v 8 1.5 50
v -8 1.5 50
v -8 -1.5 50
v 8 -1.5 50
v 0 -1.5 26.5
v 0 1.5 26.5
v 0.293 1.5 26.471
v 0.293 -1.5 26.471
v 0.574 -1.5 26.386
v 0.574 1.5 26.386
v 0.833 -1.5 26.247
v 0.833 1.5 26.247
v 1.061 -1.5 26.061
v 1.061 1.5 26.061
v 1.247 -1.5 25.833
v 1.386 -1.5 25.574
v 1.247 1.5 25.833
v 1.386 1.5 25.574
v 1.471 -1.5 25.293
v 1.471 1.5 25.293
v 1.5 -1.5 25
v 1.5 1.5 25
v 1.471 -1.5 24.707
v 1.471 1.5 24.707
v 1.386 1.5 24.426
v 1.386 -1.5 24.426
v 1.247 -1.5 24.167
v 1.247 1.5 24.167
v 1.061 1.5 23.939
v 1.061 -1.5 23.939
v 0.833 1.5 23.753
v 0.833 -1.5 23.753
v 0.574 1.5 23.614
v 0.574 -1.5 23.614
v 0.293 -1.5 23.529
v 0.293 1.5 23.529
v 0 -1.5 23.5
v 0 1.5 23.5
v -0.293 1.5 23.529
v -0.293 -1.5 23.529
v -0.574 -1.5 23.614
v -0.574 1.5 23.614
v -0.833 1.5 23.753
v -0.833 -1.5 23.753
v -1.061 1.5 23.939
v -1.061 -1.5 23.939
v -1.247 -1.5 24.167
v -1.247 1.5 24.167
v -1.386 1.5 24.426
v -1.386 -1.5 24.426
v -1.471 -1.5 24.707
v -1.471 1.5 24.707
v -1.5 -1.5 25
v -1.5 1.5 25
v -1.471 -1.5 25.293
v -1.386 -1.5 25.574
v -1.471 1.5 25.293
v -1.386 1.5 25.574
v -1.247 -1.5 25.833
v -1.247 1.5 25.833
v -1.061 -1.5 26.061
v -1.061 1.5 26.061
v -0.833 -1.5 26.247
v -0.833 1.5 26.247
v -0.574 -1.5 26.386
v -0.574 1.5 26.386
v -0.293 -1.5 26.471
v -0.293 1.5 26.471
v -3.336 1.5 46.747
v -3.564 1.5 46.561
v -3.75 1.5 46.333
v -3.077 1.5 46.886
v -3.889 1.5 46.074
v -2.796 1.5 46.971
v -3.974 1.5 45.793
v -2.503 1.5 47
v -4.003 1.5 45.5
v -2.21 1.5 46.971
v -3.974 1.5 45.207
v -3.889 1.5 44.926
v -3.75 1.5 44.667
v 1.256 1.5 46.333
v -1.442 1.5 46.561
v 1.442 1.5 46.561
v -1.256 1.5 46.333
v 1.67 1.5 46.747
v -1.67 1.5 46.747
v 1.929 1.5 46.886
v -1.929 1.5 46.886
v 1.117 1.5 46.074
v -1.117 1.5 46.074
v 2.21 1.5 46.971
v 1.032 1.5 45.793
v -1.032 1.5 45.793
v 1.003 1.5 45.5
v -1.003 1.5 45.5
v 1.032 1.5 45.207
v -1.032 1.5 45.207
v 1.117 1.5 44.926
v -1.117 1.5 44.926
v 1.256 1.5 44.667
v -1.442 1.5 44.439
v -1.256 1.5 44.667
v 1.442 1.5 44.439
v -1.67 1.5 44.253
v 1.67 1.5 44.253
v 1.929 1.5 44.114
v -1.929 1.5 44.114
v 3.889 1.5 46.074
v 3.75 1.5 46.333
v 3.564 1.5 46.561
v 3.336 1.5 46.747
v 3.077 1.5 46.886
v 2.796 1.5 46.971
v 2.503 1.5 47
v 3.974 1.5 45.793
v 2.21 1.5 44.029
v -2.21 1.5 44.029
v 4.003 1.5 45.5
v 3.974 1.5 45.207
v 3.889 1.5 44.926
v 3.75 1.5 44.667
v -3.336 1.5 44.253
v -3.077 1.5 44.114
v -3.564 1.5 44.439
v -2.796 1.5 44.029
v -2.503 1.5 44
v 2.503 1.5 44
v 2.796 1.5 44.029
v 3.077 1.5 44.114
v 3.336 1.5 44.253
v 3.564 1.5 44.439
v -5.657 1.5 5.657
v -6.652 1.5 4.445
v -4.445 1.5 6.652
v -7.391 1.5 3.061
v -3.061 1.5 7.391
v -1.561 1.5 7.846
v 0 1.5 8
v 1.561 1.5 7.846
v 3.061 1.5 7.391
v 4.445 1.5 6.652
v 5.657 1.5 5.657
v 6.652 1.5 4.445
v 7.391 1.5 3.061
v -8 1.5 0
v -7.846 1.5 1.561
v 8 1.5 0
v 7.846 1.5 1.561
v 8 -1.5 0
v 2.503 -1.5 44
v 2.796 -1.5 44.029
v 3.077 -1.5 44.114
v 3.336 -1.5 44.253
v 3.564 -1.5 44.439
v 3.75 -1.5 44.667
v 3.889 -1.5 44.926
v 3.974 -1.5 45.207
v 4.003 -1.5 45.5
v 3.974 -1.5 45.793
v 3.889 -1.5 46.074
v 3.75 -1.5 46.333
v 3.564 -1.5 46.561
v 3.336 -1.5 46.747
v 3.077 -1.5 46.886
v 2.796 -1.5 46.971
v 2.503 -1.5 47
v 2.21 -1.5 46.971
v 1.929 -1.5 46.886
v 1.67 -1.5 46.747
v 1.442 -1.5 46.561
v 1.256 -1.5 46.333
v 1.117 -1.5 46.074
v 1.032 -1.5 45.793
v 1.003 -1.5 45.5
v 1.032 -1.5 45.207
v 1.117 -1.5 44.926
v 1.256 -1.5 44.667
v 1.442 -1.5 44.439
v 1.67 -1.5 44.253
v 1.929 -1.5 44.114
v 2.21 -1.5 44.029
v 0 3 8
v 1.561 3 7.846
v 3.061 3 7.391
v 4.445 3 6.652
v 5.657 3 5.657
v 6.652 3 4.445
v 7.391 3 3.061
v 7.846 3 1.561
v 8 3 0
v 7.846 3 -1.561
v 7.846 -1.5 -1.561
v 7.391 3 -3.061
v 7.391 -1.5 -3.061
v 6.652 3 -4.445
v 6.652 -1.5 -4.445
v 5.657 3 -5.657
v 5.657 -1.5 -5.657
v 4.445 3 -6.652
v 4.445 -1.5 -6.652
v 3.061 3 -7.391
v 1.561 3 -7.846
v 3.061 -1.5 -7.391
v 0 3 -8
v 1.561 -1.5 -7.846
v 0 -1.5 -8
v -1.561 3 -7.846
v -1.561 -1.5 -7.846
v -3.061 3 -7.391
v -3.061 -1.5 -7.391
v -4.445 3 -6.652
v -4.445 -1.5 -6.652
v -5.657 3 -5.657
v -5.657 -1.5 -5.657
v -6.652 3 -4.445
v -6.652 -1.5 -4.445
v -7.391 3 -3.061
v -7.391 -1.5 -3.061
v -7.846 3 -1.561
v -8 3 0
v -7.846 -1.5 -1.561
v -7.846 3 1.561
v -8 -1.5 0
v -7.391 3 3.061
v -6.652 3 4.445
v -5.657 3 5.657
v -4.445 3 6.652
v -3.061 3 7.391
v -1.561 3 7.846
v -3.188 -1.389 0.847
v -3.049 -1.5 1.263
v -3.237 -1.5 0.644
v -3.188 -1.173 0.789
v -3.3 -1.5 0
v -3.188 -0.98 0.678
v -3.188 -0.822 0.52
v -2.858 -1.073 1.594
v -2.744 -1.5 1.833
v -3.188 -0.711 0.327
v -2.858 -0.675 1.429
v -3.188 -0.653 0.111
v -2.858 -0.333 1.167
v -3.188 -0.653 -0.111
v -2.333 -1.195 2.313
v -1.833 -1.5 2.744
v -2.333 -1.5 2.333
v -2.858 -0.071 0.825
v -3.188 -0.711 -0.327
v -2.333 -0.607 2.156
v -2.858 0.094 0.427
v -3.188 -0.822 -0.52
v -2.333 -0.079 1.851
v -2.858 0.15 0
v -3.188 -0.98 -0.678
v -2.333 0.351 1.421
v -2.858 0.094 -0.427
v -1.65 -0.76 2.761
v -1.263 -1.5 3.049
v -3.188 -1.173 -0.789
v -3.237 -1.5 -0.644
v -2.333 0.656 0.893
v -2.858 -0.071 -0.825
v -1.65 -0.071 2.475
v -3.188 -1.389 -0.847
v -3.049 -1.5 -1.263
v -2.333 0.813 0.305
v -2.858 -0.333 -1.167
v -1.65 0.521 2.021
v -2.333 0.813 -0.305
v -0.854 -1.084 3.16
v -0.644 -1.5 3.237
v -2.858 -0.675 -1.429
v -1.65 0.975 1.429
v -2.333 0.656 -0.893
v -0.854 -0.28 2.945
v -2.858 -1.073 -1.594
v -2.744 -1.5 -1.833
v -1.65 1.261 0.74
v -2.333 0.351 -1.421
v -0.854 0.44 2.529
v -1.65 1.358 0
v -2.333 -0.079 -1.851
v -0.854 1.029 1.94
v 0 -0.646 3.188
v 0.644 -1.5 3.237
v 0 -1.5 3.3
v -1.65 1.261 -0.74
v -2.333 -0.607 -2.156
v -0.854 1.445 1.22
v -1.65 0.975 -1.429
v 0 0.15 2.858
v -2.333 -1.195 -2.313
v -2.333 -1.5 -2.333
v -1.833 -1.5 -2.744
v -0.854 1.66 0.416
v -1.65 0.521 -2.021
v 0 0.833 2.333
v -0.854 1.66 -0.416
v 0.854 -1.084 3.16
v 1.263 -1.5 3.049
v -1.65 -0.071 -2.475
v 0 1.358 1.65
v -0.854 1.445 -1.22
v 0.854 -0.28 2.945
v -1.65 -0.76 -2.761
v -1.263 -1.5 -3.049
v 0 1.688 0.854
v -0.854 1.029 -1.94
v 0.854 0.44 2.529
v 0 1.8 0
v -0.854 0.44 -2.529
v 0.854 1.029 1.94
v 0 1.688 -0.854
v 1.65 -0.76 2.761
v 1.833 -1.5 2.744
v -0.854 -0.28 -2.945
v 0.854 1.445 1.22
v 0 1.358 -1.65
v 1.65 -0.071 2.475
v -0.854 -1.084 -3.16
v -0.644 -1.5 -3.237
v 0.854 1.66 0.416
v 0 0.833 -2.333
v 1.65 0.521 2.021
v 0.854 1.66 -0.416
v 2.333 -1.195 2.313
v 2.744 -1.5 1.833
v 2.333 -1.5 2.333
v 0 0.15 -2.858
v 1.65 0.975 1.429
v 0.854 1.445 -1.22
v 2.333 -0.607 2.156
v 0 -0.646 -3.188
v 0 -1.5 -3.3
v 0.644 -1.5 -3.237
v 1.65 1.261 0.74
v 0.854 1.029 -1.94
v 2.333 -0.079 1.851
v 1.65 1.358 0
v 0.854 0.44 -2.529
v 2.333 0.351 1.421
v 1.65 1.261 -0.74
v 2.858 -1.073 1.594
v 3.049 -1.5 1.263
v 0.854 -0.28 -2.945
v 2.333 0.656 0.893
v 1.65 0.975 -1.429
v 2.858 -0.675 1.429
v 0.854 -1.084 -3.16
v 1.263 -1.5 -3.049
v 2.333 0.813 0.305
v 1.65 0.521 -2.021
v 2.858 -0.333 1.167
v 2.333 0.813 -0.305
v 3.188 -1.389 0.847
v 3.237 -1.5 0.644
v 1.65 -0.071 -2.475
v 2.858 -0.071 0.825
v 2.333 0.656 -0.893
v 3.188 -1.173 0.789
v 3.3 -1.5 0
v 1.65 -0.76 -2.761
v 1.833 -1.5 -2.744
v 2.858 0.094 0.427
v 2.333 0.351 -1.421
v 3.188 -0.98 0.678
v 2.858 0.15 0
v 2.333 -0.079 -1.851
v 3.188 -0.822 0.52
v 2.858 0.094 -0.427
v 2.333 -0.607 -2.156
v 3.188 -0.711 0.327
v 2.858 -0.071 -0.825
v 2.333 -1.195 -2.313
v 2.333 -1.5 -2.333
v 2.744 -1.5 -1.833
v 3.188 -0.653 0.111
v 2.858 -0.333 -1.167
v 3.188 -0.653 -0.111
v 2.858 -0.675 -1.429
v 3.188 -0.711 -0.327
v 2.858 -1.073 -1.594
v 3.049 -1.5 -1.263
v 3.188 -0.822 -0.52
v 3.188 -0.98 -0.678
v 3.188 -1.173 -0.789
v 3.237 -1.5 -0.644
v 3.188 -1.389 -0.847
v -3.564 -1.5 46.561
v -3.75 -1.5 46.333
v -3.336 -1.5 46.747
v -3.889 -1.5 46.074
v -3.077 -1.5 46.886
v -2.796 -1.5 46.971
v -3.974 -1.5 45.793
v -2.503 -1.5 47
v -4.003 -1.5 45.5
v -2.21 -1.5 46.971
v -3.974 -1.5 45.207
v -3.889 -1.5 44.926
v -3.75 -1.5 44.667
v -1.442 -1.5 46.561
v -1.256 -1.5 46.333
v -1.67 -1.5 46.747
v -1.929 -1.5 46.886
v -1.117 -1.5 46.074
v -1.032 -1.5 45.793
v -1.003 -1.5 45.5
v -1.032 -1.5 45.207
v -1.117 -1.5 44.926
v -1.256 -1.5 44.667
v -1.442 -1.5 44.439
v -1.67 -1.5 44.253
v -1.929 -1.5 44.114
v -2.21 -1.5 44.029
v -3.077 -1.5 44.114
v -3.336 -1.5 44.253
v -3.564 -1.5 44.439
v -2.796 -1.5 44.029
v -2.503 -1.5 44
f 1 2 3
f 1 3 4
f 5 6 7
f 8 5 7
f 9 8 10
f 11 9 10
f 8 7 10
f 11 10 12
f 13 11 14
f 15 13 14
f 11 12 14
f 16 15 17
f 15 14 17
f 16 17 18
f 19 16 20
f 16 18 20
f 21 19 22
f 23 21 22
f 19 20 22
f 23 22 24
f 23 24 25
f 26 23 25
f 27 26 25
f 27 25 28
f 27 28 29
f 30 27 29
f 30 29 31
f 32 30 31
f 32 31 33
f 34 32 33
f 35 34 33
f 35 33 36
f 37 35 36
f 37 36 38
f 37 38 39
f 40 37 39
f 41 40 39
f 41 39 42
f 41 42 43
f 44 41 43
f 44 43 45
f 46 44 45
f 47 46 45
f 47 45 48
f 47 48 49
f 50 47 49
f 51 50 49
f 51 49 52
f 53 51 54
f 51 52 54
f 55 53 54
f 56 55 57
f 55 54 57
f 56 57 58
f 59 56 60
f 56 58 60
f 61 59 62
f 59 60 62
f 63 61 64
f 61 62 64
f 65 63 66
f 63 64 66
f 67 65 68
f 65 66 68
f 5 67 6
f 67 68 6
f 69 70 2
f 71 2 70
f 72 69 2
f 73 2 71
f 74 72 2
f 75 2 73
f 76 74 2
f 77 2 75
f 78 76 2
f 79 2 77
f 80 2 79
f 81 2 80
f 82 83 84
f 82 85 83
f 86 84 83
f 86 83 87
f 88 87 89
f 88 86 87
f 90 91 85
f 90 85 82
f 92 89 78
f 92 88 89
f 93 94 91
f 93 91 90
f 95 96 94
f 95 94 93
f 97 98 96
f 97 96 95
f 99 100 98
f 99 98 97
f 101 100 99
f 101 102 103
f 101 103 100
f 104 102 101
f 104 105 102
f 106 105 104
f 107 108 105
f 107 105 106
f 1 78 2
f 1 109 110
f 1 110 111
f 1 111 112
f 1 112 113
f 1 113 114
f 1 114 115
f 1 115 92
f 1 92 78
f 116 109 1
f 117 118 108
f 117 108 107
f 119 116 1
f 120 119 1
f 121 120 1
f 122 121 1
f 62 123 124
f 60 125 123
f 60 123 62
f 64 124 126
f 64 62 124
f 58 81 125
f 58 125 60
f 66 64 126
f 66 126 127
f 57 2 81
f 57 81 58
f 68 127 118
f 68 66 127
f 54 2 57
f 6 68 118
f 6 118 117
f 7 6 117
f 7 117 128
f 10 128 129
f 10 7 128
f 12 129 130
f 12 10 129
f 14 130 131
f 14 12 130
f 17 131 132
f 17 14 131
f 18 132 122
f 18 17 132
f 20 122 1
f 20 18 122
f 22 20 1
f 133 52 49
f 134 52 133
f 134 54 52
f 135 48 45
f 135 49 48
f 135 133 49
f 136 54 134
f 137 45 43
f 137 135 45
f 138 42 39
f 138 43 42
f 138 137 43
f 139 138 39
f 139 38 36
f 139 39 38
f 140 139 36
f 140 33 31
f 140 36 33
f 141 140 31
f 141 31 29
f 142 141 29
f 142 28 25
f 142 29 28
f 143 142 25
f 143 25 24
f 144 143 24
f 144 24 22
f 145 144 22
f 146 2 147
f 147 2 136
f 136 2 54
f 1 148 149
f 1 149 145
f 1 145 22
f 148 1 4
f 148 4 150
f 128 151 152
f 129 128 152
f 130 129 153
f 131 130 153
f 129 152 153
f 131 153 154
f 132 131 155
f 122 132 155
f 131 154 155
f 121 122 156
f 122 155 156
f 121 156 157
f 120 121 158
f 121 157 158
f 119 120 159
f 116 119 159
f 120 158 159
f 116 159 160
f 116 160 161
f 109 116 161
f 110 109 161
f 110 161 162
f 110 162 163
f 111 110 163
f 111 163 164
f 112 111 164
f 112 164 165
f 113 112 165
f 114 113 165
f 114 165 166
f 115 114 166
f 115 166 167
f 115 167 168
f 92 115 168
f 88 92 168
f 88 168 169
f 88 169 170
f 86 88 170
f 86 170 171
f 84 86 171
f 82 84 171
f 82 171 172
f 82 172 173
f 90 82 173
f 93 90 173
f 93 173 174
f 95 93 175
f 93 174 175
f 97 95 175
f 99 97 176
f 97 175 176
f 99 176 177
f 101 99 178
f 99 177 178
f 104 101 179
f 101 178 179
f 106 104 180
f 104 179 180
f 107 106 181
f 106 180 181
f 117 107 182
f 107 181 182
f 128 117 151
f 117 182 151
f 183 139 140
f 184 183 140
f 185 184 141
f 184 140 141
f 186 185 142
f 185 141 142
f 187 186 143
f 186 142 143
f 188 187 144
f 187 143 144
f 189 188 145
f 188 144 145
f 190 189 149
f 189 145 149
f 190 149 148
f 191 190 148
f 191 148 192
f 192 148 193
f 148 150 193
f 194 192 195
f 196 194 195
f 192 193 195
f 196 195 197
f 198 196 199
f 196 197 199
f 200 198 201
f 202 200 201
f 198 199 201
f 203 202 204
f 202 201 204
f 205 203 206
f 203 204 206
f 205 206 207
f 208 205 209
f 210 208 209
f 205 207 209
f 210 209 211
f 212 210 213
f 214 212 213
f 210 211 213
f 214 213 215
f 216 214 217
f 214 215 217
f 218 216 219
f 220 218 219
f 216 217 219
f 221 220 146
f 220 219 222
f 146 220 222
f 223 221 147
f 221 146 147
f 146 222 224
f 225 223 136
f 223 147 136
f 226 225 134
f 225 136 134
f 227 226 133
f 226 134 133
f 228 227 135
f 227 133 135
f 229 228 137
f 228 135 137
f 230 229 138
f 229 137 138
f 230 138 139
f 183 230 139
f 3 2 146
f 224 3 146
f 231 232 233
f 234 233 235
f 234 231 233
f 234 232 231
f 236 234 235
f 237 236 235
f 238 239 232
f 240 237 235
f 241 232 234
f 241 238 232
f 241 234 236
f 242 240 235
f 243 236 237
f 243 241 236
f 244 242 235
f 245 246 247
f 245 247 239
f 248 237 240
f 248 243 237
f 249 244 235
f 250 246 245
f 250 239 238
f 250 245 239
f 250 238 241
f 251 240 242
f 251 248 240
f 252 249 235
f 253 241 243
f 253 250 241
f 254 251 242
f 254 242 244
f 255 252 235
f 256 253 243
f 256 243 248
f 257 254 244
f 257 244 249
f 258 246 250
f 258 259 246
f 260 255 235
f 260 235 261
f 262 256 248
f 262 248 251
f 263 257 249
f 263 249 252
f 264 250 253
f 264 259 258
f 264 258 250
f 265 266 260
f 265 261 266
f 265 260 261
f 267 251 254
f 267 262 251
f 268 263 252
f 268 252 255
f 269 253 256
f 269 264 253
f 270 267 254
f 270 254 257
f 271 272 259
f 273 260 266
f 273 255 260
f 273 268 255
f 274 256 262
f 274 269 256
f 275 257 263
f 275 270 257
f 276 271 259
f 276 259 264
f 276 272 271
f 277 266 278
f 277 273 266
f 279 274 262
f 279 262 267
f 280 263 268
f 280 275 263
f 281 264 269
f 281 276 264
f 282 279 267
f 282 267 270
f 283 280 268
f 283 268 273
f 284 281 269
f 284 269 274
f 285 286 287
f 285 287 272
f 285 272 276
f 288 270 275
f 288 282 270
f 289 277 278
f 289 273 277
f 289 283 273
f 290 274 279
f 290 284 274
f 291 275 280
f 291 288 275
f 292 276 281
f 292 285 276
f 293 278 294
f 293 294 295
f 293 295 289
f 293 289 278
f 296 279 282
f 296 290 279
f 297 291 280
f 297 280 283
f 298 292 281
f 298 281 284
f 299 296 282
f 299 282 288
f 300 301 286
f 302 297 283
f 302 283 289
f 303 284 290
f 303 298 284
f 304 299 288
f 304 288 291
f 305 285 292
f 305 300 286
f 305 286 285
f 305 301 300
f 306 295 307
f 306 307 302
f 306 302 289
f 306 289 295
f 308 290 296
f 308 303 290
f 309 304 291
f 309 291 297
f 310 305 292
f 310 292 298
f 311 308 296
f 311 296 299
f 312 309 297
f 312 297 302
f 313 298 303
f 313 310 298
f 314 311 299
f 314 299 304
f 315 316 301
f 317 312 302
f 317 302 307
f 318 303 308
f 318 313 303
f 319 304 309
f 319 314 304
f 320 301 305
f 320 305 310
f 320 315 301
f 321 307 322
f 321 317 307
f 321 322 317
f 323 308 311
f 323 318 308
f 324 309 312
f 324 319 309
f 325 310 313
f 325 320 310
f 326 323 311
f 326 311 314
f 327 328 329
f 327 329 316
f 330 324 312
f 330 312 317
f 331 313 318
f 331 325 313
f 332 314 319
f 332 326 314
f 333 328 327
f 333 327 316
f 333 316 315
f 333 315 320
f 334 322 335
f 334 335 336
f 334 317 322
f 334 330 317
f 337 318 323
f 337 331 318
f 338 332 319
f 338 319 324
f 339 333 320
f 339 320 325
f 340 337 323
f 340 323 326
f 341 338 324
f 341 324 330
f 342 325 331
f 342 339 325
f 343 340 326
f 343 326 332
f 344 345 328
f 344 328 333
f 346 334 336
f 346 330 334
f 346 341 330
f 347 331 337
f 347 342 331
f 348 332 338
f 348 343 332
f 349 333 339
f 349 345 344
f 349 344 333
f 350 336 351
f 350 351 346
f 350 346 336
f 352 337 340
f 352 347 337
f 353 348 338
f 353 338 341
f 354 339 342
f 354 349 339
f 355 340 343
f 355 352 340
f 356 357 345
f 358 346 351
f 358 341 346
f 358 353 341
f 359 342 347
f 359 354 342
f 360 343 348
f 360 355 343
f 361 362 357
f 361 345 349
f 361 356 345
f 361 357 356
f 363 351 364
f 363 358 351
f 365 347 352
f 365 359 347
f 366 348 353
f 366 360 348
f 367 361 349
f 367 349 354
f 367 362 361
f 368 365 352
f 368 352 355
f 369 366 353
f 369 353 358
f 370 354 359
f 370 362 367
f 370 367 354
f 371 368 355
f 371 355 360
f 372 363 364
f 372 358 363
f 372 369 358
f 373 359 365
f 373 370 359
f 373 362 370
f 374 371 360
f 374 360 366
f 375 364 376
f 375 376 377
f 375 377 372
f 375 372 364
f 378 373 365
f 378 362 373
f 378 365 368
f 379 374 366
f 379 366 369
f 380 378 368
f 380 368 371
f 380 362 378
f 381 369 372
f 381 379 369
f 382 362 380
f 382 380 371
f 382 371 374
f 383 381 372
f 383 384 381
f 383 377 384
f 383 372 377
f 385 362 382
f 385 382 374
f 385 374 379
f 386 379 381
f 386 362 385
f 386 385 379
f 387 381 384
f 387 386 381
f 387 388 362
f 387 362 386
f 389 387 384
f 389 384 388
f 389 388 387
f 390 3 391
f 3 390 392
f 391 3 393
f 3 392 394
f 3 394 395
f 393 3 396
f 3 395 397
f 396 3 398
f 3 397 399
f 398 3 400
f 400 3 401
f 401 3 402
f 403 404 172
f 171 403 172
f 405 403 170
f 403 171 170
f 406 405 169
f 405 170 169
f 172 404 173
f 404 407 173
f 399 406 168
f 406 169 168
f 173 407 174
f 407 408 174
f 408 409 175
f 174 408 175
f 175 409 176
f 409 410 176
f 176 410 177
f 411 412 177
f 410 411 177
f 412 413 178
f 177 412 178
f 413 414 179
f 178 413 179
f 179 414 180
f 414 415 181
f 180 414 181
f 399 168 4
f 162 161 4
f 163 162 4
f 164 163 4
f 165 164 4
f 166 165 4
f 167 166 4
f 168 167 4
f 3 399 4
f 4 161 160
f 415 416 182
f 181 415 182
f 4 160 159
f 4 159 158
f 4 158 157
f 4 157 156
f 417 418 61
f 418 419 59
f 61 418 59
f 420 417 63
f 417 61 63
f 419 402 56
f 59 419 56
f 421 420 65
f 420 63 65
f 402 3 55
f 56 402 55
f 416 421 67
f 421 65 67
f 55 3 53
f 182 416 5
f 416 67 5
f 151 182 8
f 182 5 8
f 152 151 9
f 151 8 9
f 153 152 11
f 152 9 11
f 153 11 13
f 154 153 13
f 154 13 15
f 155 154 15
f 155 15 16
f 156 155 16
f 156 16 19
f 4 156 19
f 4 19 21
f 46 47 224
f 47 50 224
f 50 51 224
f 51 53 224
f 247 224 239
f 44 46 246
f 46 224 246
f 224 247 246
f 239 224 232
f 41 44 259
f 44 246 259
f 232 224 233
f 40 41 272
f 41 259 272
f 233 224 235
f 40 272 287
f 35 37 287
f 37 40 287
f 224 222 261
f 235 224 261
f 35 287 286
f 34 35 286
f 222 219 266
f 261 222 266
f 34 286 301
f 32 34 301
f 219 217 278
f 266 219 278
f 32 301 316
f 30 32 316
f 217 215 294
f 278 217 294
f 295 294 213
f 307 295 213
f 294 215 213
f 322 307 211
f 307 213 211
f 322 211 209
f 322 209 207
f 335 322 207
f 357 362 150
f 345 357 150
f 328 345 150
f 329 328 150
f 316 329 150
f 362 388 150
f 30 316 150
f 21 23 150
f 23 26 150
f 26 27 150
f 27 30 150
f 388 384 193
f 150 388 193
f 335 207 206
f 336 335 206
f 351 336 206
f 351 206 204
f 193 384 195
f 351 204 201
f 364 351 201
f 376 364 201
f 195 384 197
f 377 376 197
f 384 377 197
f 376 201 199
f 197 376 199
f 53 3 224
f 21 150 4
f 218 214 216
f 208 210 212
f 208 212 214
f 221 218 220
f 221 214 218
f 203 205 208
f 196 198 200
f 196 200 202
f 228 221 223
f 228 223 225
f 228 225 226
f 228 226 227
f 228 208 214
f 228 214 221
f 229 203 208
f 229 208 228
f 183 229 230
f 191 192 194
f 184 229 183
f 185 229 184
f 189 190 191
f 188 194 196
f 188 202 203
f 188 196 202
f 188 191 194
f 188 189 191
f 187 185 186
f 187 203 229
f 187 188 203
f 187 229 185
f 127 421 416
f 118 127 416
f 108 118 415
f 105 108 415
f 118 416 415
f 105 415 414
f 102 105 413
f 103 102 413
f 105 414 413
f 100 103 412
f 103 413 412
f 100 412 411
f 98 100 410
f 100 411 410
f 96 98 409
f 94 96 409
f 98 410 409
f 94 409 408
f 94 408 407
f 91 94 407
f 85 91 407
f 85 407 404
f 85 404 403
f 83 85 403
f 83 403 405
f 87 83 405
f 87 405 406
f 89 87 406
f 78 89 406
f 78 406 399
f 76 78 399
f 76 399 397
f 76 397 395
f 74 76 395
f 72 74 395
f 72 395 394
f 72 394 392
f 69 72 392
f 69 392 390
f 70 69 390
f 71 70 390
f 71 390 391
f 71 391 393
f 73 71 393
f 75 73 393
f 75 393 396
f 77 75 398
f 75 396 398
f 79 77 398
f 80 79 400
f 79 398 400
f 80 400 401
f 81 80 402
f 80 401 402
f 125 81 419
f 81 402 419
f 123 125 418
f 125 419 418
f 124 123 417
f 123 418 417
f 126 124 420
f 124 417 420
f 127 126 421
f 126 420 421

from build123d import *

# Parameters (mm, degrees)
BOSS_EXTRUDE1_DEPTH      = 3
BOSS_EXTRUDE1_DEPTH_BACK = 1.5
SKETCH1_R                = 8
SKETCH2_W                = 16
SKETCH2_H                = 50
BOSS_EXTRUDE2_DEPTH      = 1.5
CUT_EXTRUDE1_REACH       = 52.836
SKETCH3_R                = 1.5
CUT_EXTRUDE3_REACH       = 52.725
SKETCH5_R                = 1.5


with BuildPart() as part:
    # Sketch1 → Boss-Extrude1 (new, two sides: drawn at the far end of the back side and taken through both)
    with BuildSketch(Plane(origin=(0, 0, 0), x_dir=(1, 0, 0), z_dir=(0, 1, 0)).offset(-BOSS_EXTRUDE1_DEPTH_BACK)):
        Circle(SKETCH1_R)
    extrude(amount=BOSS_EXTRUDE1_DEPTH + BOSS_EXTRUDE1_DEPTH_BACK)

    # Sketch2 → Boss-Extrude2 (add, symmetric)
    with BuildSketch(Plane(origin=(0, 0, 0), x_dir=(1, 0, 0), z_dir=(0, 1, 0))):
        with Locations((0, -25)):
            Rectangle(SKETCH2_W, SKETCH2_H)
    extrude(amount=BOSS_EXTRUDE2_DEPTH, both=True)

    # Sketch3 → Cut-Extrude1 (cut, up to next)
    with BuildSketch(Plane(origin=(0, -1.5, 0), x_dir=(-1, 0, 0), z_dir=(0, -1, 0)), mode=Mode.PRIVATE) as cut_extrude1_sk1:
        with Locations((2.503073418, -45.5)):
            Circle(SKETCH3_R)
    cut_extrude1_tool1 = extrude(cut_extrude1_sk1.sketch, amount=-CUT_EXTRUDE1_REACH, mode=Mode.PRIVATE) & part.part
    # Sketch3 → Cut-Extrude1 (cut, up to next)
    with BuildSketch(Plane(origin=(0, -1.5, 0), x_dir=(-1, 0, 0), z_dir=(0, -1, 0)), mode=Mode.PRIVATE) as cut_extrude1_sk2:
        with Locations((-2.503073418, -45.5)):
            Circle(SKETCH3_R)
    cut_extrude1_tool2 = extrude(cut_extrude1_sk2.sketch, amount=-CUT_EXTRUDE1_REACH, mode=Mode.PRIVATE) & part.part
    add(cut_extrude1_tool1.solids().sort_by_distance((-2.503073, -1.5, 45.5))[0], mode=Mode.SUBTRACT)
    add(cut_extrude1_tool2.solids().sort_by_distance((2.503073, -1.5, 45.5))[0], mode=Mode.SUBTRACT)

    # Sketch4 → Cut-Revolve21 (revolve, cut)
    with BuildSketch(Plane(origin=(0, -1.5, 0), x_dir=(-1, 0, 0), z_dir=(0, -1, 0))):
        with BuildLine():
            Line((3.3, 0), (-3.3, 0))
            ThreePointArc((-3.3, 0), (0, -3.3), (3.3, 0))
        make_face()
    revolve(axis=Axis((3.3, -1.5, 0), (-1, 0, 0)), mode=Mode.SUBTRACT)

    # Sketch5 → Cut-Extrude3 (cut, up to next)
    with BuildSketch(Plane(origin=(0, 1.5, 0), x_dir=(1, 0, 0), z_dir=(0, 1, 0)), mode=Mode.PRIVATE) as cut_extrude3_sk1:
        with Locations((0, -25)):
            Circle(SKETCH5_R)
    cut_extrude3_tool1 = extrude(cut_extrude3_sk1.sketch, amount=-CUT_EXTRUDE3_REACH, mode=Mode.PRIVATE) & part.part
    add(cut_extrude3_tool1.solids().sort_by_distance((0, 1.5, 25))[0], mode=Mode.SUBTRACT)


solid = part.part
